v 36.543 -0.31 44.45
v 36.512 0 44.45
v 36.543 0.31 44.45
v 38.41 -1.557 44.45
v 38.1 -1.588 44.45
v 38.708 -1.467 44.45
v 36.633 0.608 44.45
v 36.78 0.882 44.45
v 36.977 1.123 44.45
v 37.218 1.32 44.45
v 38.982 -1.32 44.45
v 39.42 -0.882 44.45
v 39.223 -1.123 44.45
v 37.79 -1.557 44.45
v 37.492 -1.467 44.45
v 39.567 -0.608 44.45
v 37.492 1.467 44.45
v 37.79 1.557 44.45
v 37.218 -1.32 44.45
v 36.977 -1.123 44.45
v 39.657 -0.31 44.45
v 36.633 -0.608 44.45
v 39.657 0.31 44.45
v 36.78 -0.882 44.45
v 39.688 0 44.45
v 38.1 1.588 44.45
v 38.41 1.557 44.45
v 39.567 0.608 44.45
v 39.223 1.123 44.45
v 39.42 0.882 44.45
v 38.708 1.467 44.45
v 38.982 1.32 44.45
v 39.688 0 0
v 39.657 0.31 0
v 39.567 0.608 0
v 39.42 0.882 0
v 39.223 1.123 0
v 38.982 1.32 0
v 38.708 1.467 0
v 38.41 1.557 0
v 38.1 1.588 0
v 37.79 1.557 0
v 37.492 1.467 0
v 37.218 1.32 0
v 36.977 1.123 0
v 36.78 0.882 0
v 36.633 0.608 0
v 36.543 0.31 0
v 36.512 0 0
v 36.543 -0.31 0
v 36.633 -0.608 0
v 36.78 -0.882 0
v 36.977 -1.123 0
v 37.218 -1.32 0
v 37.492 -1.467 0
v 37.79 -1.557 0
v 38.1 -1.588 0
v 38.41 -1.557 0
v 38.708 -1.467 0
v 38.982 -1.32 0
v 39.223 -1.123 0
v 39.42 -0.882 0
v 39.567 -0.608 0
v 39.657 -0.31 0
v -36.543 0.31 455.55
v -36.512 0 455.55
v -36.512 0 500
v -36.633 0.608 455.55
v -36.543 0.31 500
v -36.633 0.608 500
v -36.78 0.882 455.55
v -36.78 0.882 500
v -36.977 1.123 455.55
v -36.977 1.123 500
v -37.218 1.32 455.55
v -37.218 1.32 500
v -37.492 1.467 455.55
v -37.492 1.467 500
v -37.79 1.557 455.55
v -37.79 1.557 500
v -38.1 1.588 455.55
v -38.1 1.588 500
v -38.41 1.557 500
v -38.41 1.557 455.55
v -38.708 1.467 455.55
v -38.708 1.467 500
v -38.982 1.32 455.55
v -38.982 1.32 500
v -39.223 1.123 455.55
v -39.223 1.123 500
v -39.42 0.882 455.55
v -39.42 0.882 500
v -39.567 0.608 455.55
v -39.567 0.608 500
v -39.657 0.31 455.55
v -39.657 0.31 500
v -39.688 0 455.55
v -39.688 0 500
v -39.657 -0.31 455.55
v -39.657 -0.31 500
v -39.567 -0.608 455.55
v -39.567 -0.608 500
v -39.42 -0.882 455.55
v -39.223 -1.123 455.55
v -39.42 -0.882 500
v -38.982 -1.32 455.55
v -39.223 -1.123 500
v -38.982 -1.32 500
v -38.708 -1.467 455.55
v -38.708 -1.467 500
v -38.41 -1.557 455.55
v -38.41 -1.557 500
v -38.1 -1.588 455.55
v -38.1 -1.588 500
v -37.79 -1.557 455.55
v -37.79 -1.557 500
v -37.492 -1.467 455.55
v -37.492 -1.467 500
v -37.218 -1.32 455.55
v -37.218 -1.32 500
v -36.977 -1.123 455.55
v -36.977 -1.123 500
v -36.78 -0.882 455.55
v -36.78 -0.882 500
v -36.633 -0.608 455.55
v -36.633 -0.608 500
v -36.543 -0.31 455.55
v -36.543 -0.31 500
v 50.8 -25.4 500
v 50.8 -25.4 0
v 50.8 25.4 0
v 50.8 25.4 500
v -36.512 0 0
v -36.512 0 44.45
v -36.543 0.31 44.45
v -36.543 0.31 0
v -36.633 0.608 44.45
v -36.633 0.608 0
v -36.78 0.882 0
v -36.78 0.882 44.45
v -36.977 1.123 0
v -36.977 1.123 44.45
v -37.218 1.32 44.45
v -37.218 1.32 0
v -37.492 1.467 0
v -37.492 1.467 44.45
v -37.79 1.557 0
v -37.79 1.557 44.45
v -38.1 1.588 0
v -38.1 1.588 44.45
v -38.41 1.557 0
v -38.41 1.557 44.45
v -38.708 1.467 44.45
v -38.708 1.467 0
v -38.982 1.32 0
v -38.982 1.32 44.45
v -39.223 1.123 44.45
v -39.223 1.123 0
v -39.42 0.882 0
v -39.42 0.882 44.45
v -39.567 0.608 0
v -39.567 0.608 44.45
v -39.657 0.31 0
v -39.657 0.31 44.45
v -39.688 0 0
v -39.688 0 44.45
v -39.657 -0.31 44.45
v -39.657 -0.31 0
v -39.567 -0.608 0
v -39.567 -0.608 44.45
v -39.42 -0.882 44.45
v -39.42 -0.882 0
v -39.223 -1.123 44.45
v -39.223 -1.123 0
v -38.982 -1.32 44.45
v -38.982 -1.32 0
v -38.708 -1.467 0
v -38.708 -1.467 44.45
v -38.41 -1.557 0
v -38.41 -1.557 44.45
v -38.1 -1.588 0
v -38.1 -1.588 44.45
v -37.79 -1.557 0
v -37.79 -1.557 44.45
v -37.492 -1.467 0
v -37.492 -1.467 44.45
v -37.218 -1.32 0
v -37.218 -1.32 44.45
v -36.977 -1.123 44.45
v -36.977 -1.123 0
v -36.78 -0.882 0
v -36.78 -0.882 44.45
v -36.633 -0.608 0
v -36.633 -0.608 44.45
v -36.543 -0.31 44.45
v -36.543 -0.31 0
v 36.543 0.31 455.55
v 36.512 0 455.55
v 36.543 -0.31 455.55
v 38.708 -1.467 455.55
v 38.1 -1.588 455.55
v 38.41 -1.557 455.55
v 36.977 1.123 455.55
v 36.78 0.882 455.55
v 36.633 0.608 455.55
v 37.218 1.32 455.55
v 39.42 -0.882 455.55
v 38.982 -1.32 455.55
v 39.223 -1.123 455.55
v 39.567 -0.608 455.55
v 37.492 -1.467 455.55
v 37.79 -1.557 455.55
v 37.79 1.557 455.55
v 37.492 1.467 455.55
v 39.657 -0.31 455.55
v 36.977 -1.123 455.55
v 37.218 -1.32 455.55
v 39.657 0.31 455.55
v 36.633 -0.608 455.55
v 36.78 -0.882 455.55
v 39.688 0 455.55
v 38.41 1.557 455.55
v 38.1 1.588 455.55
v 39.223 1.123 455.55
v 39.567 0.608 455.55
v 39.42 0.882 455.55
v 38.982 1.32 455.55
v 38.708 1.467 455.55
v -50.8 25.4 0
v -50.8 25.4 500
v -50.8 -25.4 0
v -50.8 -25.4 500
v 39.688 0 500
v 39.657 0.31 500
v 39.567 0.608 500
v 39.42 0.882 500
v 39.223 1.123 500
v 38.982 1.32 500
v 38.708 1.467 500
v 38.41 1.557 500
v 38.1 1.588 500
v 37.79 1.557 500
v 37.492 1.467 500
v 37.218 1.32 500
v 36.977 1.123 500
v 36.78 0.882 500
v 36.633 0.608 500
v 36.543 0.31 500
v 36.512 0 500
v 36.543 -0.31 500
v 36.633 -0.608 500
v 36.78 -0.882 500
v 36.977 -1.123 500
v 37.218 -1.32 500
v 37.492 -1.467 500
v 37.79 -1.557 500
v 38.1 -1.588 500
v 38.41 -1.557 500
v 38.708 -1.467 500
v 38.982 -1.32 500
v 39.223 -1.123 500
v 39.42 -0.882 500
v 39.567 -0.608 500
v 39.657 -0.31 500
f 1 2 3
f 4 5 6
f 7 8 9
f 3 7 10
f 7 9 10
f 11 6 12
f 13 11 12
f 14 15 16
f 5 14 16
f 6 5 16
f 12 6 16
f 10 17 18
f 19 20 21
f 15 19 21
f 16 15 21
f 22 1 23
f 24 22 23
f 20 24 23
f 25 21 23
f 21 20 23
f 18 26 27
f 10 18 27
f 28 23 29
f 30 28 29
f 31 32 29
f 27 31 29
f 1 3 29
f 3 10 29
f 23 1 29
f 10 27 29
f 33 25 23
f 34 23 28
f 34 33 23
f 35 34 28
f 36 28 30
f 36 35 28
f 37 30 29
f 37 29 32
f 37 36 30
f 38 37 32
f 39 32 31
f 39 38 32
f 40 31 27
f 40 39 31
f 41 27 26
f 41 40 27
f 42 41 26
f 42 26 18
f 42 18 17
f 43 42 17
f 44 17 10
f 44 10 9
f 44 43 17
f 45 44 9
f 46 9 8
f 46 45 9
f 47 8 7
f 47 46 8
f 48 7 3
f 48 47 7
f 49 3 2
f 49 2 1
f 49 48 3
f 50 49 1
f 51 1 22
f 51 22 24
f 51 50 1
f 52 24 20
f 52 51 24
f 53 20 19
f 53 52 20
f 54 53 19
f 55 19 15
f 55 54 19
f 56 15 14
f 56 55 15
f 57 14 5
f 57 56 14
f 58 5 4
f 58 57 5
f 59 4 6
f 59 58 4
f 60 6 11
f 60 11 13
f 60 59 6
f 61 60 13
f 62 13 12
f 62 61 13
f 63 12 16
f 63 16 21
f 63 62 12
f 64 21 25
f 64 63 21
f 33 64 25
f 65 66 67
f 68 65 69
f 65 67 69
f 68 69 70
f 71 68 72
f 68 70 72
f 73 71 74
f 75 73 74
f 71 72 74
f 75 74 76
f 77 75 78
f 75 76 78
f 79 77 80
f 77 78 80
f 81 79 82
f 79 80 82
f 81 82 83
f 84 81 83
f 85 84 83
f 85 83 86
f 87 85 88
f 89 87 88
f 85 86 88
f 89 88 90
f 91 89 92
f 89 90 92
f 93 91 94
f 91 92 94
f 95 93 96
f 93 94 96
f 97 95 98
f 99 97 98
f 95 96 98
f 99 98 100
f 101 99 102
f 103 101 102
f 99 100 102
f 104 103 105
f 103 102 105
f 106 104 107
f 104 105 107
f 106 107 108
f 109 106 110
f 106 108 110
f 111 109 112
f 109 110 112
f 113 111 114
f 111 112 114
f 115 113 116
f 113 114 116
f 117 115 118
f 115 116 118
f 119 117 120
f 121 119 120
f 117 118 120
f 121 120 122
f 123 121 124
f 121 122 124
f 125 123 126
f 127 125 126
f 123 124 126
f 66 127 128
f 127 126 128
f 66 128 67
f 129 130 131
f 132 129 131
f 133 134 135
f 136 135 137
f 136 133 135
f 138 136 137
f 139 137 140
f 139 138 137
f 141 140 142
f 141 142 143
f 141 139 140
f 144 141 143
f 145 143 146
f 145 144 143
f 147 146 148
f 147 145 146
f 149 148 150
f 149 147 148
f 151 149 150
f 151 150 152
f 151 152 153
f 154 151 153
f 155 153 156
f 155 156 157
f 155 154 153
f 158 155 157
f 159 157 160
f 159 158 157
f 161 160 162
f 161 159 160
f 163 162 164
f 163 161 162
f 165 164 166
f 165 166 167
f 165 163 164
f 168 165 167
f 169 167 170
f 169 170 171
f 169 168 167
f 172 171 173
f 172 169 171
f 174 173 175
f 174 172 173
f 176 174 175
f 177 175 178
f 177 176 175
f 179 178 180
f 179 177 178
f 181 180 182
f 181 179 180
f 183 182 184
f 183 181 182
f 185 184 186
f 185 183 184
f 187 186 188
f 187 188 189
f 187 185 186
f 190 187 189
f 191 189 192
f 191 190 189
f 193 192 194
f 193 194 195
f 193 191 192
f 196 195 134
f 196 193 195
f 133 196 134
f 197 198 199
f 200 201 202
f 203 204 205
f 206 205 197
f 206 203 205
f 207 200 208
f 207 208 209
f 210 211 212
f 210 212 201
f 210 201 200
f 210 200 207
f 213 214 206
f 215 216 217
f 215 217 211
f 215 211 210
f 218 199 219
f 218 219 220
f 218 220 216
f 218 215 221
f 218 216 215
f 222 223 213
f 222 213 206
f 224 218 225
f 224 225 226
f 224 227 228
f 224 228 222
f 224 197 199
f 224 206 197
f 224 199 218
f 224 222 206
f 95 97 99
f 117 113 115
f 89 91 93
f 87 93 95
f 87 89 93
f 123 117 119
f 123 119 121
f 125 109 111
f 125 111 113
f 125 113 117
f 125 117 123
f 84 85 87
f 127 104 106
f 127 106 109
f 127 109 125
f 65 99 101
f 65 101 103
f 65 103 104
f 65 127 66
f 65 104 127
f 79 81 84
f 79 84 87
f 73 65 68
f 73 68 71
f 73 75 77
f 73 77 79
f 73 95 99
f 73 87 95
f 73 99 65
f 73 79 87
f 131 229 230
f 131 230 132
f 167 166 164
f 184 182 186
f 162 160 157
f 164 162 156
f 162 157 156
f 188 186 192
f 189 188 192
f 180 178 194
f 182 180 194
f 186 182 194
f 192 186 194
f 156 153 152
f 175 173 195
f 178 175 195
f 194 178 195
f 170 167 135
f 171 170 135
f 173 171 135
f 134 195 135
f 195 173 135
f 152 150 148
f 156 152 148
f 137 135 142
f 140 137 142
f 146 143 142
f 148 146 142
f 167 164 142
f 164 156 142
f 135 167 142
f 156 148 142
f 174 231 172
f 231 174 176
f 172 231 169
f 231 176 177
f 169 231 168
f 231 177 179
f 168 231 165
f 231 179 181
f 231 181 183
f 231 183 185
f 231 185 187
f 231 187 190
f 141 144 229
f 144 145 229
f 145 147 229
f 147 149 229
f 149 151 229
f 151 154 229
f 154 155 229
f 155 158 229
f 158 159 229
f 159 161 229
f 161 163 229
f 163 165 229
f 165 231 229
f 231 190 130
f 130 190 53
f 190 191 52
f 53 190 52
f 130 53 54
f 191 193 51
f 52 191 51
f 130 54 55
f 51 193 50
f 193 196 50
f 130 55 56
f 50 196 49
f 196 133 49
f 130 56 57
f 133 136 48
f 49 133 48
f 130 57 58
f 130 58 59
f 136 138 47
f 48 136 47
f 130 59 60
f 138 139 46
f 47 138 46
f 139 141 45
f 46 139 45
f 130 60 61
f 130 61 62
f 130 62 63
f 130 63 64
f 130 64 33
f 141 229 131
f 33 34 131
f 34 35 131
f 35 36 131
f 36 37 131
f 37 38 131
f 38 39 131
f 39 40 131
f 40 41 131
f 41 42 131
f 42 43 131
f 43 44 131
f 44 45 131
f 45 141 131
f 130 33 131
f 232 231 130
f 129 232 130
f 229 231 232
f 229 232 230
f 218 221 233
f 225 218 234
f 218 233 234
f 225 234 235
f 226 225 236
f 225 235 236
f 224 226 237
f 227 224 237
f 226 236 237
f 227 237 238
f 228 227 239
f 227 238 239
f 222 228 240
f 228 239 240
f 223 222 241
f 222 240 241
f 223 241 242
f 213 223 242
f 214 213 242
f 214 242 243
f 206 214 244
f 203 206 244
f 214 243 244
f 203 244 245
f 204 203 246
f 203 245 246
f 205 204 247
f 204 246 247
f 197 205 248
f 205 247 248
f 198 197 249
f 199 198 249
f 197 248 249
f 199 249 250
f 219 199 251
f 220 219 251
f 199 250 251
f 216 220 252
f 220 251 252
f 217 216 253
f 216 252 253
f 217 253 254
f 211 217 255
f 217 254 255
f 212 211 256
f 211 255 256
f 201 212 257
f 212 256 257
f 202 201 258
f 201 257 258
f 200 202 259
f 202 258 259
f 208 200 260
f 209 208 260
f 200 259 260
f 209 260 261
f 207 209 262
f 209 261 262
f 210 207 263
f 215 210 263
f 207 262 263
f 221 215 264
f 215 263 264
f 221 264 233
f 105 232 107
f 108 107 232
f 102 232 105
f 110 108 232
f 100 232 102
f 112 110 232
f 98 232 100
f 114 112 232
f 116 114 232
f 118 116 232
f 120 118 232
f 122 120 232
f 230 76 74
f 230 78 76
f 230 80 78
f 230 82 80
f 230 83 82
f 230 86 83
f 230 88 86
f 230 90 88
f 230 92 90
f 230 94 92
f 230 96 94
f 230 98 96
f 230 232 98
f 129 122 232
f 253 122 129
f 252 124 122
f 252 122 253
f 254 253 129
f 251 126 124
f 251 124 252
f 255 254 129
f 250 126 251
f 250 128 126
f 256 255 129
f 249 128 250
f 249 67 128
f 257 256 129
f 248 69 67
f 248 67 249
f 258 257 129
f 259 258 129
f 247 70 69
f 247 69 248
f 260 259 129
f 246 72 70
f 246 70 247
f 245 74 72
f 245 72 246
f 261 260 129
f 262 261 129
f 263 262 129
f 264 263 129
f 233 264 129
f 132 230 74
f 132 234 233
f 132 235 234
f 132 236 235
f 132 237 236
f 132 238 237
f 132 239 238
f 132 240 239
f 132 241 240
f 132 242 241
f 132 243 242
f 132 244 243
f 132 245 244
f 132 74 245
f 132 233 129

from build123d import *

# Parameters (mm, degrees)
SKETCH1_W           = 101.6
SKETCH1_H           = 50.8
BOSS_EXTRUDE1_DEPTH = 500
SKETCH2_R           = 1.5875
CUT_EXTRUDE1_DEPTH  = 44.45


with BuildPart() as part:
    # Sketch1 → Boss-Extrude1 (new body)
    with BuildSketch(Plane.XY):
        Rectangle(SKETCH1_W, SKETCH1_H)
    extrude(amount=BOSS_EXTRUDE1_DEPTH)

    # Sketch2 → Cut-Extrude1 (cut)
    with BuildSketch(Plane.XY.offset(500)):
        with Locations((-38.1, 0)):
            Circle(SKETCH2_R)
        with Locations((38.1, 0)):
            Circle(SKETCH2_R)
    cut_extrude1 = extrude(amount=-CUT_EXTRUDE1_DEPTH, mode=Mode.SUBTRACT)

    # Mirror1: Cut-Extrude1 across plane
    add(cut_extrude1.mirror(Plane(origin=(0, 0, 250), x_dir=(1, 0, 0), z_dir=(0, 0, -1))), mode=Mode.SUBTRACT)


solid = part.part
